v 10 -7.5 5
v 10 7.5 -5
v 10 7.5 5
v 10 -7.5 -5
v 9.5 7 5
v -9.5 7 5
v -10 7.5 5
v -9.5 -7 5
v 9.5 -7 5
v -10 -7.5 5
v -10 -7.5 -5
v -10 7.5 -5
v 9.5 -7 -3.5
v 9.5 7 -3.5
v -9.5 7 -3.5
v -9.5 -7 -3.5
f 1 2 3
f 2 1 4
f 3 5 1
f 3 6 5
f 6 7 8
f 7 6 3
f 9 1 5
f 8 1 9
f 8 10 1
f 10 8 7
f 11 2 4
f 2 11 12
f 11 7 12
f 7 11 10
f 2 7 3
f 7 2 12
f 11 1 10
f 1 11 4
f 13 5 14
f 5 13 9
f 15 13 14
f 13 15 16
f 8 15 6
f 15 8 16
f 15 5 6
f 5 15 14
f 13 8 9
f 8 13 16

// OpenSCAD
//Variables

//Width of Box
Width = 20;
//Lenght of Box
Length = 15;
//Height of Box
Height = 10;
//WallThickness of Box
WallThickness = 1;

//OuterCube
module LargeCube() {
    cube(size = [Width,Length,Height], center=true);
}

//InnerCuttout
module SmallCube() {
    cube(size = [Width-WallThickness, Length-WallThickness, Height-WallThickness], center=true);
}
//Difference
difference() {
    LargeCube(center=true);
    translate([0,0,WallThickness], center =true) SmallCube(center = true);
}
